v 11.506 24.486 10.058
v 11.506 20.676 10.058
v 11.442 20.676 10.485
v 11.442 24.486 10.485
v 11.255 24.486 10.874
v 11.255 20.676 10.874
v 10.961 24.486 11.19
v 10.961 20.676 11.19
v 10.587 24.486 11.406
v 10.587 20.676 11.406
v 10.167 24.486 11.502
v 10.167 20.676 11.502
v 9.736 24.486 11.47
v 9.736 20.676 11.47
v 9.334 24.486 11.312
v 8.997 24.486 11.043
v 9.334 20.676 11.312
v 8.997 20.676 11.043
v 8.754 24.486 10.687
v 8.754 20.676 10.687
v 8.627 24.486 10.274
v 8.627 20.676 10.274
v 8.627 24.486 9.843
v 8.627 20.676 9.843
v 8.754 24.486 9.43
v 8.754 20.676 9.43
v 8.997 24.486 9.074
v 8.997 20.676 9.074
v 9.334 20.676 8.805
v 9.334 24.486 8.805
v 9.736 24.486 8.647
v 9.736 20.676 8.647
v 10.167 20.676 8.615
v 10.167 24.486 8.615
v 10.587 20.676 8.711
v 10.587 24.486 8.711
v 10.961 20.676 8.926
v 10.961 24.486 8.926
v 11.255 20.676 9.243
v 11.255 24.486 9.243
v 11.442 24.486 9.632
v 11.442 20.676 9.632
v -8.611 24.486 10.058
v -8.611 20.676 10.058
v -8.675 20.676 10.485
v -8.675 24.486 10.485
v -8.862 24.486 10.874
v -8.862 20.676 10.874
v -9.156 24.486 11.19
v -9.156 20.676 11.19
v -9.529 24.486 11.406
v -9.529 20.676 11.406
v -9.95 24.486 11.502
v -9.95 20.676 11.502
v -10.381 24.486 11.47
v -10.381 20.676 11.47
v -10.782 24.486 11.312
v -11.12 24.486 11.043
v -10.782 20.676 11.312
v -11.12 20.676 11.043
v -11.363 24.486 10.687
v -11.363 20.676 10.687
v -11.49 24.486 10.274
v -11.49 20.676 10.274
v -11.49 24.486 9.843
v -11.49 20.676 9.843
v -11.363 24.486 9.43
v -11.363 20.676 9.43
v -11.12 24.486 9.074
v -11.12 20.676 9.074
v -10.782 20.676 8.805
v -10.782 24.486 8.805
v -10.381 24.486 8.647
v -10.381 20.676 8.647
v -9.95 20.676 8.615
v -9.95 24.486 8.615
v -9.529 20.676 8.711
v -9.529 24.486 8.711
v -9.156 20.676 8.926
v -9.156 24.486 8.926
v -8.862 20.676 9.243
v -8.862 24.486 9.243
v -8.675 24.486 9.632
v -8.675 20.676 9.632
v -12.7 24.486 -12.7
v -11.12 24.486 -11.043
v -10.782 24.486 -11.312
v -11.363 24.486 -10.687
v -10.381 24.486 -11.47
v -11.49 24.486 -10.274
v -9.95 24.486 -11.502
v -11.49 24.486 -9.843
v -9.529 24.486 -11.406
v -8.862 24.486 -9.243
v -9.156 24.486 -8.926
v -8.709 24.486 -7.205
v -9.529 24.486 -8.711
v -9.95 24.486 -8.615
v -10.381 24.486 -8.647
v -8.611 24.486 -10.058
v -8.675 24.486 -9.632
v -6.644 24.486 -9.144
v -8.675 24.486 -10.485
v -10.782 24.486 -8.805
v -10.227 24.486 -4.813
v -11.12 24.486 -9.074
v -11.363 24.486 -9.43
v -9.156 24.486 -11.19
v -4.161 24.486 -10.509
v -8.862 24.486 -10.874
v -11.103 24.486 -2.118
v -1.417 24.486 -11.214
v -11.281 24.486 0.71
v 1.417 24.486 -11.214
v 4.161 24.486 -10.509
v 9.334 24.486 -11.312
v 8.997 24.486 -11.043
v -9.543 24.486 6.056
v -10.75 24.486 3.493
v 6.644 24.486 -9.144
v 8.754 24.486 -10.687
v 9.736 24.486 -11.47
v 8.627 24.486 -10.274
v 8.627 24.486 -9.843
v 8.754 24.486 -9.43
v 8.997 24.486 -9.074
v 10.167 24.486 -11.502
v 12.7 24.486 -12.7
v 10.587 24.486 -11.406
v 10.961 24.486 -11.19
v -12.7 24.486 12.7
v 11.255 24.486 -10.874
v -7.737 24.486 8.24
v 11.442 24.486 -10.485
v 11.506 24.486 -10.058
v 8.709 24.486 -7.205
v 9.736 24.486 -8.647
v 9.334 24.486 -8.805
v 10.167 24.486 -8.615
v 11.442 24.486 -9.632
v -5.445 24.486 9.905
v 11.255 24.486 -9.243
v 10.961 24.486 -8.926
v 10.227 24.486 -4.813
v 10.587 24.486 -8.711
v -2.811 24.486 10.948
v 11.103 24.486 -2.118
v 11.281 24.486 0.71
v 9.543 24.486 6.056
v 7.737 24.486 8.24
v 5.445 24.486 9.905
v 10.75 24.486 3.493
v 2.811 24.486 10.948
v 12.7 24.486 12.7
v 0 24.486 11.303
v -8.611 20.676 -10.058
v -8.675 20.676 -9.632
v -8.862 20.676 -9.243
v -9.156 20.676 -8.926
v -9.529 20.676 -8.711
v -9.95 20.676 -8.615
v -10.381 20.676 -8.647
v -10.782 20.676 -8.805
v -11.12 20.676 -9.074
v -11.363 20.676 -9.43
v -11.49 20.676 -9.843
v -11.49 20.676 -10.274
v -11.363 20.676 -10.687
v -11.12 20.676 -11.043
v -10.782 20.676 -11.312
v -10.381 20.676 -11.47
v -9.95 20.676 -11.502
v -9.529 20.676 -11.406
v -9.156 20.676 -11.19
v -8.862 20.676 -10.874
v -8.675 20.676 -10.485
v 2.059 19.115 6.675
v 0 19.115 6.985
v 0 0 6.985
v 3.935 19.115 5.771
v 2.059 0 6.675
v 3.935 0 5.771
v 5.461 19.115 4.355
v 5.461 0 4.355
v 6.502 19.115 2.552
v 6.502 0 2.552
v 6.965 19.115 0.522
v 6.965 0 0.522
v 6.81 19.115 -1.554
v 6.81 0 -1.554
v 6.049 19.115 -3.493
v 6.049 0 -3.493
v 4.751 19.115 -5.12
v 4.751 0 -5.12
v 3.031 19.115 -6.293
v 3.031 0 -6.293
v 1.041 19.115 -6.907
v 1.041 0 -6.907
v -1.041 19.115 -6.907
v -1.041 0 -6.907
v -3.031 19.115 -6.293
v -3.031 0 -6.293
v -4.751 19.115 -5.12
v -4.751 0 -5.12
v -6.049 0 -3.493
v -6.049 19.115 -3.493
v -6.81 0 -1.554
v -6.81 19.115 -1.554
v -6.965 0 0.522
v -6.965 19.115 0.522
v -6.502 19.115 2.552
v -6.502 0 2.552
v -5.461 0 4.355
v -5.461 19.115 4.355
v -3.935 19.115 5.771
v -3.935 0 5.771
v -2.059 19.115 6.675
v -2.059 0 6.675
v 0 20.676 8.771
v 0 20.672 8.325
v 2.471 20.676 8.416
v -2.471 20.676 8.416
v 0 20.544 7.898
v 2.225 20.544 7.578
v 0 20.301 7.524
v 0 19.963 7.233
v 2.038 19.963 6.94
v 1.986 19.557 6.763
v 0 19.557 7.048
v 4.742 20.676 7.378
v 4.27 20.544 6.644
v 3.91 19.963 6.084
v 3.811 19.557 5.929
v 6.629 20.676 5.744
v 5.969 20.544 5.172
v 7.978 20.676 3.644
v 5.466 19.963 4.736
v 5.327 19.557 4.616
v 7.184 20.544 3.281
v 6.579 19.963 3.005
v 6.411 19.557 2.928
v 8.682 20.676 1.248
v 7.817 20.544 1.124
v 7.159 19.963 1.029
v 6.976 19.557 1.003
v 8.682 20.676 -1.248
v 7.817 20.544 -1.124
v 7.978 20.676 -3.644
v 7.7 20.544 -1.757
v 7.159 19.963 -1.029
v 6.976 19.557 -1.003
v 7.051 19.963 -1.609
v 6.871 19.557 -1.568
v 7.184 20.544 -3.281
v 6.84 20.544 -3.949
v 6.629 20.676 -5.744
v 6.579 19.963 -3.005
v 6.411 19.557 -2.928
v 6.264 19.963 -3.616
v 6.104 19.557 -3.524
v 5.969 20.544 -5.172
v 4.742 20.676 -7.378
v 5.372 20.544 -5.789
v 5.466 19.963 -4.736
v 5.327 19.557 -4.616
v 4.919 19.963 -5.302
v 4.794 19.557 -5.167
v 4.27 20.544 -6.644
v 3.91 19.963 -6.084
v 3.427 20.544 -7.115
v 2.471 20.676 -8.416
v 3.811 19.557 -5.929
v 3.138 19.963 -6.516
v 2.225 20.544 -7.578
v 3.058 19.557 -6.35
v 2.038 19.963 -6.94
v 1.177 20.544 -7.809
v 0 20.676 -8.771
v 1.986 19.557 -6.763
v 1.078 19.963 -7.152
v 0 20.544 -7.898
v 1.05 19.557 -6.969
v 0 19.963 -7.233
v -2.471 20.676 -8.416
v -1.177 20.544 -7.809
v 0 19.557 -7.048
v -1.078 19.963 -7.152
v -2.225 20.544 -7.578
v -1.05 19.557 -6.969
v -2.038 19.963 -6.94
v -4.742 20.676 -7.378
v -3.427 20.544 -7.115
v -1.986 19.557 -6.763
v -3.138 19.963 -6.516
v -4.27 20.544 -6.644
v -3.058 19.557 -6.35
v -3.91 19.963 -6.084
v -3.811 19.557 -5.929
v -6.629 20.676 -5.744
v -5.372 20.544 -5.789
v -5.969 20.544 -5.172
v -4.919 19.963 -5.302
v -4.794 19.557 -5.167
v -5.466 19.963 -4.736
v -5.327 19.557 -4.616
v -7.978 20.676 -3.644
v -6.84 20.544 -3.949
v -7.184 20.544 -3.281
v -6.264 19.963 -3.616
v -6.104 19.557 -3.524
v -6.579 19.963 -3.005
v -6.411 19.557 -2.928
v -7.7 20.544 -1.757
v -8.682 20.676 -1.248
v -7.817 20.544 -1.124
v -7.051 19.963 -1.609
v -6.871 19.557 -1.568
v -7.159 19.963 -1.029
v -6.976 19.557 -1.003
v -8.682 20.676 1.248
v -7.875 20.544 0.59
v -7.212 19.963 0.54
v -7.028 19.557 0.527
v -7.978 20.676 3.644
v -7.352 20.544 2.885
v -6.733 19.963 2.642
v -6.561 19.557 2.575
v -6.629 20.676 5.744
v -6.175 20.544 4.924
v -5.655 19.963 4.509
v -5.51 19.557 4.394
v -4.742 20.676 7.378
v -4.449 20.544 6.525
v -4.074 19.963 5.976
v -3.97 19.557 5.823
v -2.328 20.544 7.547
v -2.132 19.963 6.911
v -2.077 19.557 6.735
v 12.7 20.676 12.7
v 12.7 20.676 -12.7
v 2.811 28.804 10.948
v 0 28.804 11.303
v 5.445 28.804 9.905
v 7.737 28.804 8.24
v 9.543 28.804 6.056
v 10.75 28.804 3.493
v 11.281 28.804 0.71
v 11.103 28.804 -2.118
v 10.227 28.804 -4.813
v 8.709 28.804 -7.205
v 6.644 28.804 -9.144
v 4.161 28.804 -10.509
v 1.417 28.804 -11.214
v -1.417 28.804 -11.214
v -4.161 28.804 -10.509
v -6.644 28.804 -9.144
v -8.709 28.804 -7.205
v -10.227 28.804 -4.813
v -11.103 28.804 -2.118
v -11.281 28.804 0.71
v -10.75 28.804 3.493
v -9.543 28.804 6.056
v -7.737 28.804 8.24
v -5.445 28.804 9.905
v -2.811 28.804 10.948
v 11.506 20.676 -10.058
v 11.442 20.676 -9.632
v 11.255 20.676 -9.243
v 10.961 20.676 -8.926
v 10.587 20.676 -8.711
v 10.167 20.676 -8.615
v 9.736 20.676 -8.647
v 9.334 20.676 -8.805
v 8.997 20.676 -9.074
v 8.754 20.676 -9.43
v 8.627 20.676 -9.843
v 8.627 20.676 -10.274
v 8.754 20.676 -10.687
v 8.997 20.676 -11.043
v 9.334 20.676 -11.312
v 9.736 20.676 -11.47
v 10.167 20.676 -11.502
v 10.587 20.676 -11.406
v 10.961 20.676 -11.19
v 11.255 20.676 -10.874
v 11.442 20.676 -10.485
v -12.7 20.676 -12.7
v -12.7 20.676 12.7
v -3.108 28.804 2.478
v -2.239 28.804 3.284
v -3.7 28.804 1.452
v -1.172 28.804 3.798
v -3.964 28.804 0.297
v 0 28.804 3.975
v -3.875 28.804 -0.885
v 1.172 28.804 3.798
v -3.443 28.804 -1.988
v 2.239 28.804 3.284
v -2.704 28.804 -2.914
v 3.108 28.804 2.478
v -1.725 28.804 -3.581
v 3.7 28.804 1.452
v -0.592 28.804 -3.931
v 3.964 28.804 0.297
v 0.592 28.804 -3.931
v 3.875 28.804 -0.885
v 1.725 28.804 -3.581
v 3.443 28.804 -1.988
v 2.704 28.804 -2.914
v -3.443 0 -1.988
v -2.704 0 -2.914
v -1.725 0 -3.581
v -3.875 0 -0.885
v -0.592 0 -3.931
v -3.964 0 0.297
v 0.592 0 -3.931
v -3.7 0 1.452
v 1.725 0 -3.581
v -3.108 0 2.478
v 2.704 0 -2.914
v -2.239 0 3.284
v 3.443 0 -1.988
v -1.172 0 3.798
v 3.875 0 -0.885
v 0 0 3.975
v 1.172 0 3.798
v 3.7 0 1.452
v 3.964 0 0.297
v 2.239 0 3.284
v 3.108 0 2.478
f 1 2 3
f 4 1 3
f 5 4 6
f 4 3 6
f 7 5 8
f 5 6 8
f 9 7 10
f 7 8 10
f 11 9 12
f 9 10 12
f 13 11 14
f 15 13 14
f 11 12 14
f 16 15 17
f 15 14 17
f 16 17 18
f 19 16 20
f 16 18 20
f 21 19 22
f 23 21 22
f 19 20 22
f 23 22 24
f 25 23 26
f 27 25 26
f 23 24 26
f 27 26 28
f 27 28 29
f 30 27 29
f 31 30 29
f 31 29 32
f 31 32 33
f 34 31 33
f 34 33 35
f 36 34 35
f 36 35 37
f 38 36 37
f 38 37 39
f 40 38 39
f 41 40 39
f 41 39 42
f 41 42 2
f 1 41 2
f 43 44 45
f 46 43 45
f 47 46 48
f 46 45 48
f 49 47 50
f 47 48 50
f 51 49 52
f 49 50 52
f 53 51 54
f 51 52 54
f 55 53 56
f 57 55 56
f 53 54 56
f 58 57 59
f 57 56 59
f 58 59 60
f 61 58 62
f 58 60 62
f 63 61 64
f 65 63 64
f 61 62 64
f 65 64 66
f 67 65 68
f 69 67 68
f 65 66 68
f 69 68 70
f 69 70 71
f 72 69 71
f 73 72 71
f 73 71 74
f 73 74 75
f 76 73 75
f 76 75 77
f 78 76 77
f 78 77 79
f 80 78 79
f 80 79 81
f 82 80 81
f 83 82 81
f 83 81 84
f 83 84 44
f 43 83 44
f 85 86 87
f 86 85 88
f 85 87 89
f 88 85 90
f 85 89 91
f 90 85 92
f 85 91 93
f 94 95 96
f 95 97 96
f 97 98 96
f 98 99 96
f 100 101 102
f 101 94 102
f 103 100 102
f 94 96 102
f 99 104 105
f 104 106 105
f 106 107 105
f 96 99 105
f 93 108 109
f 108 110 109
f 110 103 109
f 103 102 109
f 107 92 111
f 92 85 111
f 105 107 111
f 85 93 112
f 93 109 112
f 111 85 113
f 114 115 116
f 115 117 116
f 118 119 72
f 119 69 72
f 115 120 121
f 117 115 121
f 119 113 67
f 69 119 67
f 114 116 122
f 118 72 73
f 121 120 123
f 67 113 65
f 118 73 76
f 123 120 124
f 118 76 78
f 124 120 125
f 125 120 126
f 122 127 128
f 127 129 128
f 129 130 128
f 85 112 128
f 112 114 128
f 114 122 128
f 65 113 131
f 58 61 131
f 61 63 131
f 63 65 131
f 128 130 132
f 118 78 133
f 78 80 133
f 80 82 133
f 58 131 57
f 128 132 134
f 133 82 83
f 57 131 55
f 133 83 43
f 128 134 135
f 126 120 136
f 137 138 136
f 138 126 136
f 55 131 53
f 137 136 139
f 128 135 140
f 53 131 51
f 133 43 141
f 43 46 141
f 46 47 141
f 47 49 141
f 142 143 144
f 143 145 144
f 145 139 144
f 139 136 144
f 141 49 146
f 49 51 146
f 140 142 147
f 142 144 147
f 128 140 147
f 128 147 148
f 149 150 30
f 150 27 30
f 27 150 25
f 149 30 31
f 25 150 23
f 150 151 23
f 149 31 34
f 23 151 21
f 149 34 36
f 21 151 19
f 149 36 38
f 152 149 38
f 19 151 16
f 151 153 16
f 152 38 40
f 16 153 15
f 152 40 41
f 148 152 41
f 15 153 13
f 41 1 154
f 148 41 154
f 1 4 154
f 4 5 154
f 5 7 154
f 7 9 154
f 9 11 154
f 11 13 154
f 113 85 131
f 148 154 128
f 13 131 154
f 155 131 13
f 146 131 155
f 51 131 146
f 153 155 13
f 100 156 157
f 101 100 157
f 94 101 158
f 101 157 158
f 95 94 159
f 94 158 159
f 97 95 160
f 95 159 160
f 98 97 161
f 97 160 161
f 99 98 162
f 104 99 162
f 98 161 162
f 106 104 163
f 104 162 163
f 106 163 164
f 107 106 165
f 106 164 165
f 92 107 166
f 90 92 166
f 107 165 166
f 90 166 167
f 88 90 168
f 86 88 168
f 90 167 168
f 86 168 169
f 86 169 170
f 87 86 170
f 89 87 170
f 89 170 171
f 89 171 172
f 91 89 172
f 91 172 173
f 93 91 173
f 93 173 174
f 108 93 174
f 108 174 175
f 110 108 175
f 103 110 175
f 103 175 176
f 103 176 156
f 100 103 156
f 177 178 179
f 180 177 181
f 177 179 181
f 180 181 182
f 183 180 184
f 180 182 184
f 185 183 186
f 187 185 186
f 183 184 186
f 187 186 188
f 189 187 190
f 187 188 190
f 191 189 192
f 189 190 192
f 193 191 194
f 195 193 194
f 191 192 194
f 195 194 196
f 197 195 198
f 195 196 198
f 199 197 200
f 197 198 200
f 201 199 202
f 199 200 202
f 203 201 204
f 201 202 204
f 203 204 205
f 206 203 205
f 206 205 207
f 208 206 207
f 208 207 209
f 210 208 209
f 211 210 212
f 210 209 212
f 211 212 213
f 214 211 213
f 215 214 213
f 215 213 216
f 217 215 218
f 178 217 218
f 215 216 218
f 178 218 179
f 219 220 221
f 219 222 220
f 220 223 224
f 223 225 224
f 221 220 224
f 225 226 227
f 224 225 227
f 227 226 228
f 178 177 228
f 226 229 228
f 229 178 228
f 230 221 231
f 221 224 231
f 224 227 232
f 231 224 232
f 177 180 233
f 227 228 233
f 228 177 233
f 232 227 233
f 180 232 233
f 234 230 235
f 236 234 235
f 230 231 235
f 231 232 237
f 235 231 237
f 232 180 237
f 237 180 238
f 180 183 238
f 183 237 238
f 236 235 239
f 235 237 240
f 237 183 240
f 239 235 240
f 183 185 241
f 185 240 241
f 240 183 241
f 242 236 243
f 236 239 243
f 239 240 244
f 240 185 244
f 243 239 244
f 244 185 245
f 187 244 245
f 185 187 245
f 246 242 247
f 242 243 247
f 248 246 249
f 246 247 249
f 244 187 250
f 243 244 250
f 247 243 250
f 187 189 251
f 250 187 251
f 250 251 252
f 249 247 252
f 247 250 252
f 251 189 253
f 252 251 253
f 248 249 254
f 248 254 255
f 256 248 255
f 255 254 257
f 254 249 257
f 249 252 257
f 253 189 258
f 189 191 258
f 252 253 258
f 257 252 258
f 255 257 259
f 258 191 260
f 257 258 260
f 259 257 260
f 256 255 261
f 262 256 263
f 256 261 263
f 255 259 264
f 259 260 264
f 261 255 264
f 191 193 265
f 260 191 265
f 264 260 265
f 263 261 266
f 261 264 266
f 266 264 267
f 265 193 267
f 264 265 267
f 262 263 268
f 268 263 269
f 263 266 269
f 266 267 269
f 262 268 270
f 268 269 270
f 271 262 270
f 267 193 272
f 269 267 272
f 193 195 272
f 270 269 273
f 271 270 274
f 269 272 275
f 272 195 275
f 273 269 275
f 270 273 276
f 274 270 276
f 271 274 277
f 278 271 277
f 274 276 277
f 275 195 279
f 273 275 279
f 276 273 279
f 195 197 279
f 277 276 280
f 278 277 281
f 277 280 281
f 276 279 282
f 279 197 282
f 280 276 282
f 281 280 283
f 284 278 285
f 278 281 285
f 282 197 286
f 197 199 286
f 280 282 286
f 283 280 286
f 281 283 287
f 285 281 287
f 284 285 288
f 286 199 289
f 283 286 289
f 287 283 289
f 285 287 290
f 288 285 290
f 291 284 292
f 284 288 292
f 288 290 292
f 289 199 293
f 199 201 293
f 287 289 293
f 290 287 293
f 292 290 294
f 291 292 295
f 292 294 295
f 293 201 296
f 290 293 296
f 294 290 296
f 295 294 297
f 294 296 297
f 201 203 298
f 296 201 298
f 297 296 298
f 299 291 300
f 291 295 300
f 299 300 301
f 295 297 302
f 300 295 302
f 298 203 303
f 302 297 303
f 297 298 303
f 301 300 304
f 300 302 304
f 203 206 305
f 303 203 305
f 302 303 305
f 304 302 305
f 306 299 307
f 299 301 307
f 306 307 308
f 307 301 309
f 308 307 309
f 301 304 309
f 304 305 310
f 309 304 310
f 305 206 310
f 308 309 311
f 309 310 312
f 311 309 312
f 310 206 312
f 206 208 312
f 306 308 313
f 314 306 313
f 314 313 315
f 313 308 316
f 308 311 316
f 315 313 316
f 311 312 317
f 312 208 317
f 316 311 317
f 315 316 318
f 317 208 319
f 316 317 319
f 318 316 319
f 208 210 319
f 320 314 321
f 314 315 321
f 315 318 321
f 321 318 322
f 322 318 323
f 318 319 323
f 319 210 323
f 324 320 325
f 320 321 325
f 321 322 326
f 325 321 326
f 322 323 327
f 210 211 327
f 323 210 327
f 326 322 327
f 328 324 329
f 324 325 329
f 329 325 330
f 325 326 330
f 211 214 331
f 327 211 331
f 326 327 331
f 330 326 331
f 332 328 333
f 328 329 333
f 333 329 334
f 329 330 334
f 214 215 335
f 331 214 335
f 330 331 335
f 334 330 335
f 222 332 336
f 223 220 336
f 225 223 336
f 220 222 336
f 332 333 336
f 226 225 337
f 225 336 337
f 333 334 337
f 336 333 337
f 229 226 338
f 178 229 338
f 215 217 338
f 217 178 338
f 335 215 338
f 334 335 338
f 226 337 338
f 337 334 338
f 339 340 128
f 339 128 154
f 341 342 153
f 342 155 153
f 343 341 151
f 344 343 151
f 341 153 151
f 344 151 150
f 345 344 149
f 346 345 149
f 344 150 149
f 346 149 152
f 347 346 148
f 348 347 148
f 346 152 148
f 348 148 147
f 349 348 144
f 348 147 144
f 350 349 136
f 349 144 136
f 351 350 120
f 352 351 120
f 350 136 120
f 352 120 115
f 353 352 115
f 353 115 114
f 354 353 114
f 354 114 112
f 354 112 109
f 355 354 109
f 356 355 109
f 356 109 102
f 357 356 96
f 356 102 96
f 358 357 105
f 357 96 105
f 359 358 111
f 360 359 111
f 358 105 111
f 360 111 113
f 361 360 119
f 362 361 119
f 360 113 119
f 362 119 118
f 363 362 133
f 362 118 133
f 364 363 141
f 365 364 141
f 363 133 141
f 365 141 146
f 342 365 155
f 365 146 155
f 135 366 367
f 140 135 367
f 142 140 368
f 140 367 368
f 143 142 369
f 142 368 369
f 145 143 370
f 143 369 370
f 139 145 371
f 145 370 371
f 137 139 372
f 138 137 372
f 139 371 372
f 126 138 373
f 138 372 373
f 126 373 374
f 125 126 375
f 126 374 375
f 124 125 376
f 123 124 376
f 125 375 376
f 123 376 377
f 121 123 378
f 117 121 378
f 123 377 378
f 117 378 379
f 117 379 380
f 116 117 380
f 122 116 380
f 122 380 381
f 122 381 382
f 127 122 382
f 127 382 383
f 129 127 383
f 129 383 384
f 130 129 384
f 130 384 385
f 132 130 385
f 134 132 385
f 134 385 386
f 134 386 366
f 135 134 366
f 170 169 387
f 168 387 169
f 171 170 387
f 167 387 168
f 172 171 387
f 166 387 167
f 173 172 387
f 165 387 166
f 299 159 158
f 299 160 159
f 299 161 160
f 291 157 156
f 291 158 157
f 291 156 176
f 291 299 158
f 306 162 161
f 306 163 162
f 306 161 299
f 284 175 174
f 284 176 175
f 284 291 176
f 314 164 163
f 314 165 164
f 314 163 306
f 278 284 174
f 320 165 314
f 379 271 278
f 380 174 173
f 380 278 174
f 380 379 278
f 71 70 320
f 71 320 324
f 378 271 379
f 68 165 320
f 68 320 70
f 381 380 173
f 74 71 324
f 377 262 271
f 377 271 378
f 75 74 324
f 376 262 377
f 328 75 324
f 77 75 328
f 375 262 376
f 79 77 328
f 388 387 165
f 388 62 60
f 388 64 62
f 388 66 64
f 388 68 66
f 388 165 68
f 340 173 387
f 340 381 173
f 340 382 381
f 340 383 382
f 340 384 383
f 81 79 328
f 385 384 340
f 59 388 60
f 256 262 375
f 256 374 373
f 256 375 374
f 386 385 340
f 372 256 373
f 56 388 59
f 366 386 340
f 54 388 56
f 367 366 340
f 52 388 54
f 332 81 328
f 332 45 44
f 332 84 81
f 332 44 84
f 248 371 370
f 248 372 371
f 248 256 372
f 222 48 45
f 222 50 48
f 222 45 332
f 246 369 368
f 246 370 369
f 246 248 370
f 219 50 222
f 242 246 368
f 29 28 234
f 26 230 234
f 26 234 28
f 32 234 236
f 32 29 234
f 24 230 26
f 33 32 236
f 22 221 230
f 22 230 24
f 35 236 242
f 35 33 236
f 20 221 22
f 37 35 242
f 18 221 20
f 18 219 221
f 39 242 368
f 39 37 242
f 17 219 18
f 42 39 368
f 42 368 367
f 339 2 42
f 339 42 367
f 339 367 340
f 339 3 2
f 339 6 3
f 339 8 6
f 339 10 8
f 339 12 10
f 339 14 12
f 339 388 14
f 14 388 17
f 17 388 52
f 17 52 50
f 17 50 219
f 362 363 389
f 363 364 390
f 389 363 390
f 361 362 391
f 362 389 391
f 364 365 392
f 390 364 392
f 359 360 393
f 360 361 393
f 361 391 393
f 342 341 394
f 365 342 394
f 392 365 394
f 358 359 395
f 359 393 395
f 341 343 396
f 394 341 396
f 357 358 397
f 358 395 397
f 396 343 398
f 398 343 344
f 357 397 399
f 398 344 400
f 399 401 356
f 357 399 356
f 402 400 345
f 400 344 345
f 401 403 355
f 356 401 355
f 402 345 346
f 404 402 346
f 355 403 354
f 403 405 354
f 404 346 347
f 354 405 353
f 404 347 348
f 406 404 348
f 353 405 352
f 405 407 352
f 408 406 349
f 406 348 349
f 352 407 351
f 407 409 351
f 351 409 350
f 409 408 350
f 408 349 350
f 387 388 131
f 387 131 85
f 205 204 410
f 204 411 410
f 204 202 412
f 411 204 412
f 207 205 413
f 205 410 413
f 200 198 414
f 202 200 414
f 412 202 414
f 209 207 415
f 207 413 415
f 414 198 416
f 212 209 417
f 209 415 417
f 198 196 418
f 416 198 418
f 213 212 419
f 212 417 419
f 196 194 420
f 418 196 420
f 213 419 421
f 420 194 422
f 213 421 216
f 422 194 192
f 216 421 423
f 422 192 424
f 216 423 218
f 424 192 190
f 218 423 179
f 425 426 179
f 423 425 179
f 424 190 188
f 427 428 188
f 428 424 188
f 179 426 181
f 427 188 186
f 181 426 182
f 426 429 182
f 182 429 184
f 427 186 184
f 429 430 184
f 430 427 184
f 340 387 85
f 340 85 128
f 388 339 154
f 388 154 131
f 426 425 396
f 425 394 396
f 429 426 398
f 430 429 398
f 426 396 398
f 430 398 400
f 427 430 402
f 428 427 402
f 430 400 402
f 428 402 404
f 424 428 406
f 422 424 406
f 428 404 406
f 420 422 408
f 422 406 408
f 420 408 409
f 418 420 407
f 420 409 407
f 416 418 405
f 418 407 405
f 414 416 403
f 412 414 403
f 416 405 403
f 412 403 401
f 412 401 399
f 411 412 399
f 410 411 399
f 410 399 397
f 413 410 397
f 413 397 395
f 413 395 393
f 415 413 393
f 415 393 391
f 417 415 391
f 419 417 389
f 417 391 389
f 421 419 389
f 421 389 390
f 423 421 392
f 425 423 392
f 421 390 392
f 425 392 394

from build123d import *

# Parameters (mm, degrees)
F3_DEPTH = 3.81
F4_R     = 1.4478
F5_DEPTH = 25.4


with BuildPart() as f1:
    # F0 (on Right) → F1 (revolve)
    with BuildSketch(Plane.YZ):
        with BuildLine():
            Line((19.114999, 6.985), (0, 6.985))
            Line((0, 6.985), (0, 3.9751))
            Line((0, 3.9751), (28.8036, 3.9751))
            Line((28.8036, 3.9751), (28.8036, 11.303))
            Line((28.8036, 11.303), (24.4856, 11.303))
            Line((24.4856, 11.303), (24.4856, 12.7))
            Line((24.4856, 12.7), (20.6756, 12.7))
            Line((20.6756, 12.7), (20.6756, 8.770797))
            ThreePointArc((20.6756, 8.770797), (20.300805, 7.523529), (19.114999, 6.985))
        make_face()
    revolve(axis=Axis((0, 1.728549, 0), (0, 1, 0)))

    # F2 (on face) → F3 (join, through all)
    with BuildSketch(Plane.XZ.offset(-20.6756)):
        with BuildLine():
            Line((-12.7, 12.7), (-12.7, 0))
            ThreePointArc((-12.7, 0), (-8.980256, 8.980256), (0, 12.7))
            Line((0, 12.7), (-12.7, 12.7))
        make_face()
        with BuildLine():
            ThreePointArc((0, 12.7), (8.980256, 8.980256), (12.7, 0))
            Line((12.7, 0), (12.7, 12.7))
            Line((12.7, 12.7), (0, 12.7))
        make_face()
        with BuildLine():
            Line((0, -12.7), (12.7, -12.7))
            Line((12.7, -12.7), (12.7, 0))
            ThreePointArc((12.7, 0), (8.980256, -8.980256), (0, -12.7))
        make_face()
        with BuildLine():
            Line((-12.7, -12.7), (0, -12.7))
            ThreePointArc((0, -12.7), (-8.980256, -8.980256), (-12.7, 0))
            Line((-12.7, 0), (-12.7, -12.7))
        make_face()
    extrude(amount=-F3_DEPTH)

    # F4 (on face) → F5 (cut)
    with BuildSketch(Plane.XZ.offset(-20.6756)):
        with Locations((10.0584, -10.0584)):
            Circle(F4_R)
        with Locations((10.0584, 10.0584)):
            Circle(F4_R)
        with Locations((-10.0584, -10.0584)):
            Circle(F4_R)
        with Locations((-10.0584, 10.0584)):
            Circle(F4_R)
    extrude(amount=-F5_DEPTH, mode=Mode.SUBTRACT)


solid = f1.part
